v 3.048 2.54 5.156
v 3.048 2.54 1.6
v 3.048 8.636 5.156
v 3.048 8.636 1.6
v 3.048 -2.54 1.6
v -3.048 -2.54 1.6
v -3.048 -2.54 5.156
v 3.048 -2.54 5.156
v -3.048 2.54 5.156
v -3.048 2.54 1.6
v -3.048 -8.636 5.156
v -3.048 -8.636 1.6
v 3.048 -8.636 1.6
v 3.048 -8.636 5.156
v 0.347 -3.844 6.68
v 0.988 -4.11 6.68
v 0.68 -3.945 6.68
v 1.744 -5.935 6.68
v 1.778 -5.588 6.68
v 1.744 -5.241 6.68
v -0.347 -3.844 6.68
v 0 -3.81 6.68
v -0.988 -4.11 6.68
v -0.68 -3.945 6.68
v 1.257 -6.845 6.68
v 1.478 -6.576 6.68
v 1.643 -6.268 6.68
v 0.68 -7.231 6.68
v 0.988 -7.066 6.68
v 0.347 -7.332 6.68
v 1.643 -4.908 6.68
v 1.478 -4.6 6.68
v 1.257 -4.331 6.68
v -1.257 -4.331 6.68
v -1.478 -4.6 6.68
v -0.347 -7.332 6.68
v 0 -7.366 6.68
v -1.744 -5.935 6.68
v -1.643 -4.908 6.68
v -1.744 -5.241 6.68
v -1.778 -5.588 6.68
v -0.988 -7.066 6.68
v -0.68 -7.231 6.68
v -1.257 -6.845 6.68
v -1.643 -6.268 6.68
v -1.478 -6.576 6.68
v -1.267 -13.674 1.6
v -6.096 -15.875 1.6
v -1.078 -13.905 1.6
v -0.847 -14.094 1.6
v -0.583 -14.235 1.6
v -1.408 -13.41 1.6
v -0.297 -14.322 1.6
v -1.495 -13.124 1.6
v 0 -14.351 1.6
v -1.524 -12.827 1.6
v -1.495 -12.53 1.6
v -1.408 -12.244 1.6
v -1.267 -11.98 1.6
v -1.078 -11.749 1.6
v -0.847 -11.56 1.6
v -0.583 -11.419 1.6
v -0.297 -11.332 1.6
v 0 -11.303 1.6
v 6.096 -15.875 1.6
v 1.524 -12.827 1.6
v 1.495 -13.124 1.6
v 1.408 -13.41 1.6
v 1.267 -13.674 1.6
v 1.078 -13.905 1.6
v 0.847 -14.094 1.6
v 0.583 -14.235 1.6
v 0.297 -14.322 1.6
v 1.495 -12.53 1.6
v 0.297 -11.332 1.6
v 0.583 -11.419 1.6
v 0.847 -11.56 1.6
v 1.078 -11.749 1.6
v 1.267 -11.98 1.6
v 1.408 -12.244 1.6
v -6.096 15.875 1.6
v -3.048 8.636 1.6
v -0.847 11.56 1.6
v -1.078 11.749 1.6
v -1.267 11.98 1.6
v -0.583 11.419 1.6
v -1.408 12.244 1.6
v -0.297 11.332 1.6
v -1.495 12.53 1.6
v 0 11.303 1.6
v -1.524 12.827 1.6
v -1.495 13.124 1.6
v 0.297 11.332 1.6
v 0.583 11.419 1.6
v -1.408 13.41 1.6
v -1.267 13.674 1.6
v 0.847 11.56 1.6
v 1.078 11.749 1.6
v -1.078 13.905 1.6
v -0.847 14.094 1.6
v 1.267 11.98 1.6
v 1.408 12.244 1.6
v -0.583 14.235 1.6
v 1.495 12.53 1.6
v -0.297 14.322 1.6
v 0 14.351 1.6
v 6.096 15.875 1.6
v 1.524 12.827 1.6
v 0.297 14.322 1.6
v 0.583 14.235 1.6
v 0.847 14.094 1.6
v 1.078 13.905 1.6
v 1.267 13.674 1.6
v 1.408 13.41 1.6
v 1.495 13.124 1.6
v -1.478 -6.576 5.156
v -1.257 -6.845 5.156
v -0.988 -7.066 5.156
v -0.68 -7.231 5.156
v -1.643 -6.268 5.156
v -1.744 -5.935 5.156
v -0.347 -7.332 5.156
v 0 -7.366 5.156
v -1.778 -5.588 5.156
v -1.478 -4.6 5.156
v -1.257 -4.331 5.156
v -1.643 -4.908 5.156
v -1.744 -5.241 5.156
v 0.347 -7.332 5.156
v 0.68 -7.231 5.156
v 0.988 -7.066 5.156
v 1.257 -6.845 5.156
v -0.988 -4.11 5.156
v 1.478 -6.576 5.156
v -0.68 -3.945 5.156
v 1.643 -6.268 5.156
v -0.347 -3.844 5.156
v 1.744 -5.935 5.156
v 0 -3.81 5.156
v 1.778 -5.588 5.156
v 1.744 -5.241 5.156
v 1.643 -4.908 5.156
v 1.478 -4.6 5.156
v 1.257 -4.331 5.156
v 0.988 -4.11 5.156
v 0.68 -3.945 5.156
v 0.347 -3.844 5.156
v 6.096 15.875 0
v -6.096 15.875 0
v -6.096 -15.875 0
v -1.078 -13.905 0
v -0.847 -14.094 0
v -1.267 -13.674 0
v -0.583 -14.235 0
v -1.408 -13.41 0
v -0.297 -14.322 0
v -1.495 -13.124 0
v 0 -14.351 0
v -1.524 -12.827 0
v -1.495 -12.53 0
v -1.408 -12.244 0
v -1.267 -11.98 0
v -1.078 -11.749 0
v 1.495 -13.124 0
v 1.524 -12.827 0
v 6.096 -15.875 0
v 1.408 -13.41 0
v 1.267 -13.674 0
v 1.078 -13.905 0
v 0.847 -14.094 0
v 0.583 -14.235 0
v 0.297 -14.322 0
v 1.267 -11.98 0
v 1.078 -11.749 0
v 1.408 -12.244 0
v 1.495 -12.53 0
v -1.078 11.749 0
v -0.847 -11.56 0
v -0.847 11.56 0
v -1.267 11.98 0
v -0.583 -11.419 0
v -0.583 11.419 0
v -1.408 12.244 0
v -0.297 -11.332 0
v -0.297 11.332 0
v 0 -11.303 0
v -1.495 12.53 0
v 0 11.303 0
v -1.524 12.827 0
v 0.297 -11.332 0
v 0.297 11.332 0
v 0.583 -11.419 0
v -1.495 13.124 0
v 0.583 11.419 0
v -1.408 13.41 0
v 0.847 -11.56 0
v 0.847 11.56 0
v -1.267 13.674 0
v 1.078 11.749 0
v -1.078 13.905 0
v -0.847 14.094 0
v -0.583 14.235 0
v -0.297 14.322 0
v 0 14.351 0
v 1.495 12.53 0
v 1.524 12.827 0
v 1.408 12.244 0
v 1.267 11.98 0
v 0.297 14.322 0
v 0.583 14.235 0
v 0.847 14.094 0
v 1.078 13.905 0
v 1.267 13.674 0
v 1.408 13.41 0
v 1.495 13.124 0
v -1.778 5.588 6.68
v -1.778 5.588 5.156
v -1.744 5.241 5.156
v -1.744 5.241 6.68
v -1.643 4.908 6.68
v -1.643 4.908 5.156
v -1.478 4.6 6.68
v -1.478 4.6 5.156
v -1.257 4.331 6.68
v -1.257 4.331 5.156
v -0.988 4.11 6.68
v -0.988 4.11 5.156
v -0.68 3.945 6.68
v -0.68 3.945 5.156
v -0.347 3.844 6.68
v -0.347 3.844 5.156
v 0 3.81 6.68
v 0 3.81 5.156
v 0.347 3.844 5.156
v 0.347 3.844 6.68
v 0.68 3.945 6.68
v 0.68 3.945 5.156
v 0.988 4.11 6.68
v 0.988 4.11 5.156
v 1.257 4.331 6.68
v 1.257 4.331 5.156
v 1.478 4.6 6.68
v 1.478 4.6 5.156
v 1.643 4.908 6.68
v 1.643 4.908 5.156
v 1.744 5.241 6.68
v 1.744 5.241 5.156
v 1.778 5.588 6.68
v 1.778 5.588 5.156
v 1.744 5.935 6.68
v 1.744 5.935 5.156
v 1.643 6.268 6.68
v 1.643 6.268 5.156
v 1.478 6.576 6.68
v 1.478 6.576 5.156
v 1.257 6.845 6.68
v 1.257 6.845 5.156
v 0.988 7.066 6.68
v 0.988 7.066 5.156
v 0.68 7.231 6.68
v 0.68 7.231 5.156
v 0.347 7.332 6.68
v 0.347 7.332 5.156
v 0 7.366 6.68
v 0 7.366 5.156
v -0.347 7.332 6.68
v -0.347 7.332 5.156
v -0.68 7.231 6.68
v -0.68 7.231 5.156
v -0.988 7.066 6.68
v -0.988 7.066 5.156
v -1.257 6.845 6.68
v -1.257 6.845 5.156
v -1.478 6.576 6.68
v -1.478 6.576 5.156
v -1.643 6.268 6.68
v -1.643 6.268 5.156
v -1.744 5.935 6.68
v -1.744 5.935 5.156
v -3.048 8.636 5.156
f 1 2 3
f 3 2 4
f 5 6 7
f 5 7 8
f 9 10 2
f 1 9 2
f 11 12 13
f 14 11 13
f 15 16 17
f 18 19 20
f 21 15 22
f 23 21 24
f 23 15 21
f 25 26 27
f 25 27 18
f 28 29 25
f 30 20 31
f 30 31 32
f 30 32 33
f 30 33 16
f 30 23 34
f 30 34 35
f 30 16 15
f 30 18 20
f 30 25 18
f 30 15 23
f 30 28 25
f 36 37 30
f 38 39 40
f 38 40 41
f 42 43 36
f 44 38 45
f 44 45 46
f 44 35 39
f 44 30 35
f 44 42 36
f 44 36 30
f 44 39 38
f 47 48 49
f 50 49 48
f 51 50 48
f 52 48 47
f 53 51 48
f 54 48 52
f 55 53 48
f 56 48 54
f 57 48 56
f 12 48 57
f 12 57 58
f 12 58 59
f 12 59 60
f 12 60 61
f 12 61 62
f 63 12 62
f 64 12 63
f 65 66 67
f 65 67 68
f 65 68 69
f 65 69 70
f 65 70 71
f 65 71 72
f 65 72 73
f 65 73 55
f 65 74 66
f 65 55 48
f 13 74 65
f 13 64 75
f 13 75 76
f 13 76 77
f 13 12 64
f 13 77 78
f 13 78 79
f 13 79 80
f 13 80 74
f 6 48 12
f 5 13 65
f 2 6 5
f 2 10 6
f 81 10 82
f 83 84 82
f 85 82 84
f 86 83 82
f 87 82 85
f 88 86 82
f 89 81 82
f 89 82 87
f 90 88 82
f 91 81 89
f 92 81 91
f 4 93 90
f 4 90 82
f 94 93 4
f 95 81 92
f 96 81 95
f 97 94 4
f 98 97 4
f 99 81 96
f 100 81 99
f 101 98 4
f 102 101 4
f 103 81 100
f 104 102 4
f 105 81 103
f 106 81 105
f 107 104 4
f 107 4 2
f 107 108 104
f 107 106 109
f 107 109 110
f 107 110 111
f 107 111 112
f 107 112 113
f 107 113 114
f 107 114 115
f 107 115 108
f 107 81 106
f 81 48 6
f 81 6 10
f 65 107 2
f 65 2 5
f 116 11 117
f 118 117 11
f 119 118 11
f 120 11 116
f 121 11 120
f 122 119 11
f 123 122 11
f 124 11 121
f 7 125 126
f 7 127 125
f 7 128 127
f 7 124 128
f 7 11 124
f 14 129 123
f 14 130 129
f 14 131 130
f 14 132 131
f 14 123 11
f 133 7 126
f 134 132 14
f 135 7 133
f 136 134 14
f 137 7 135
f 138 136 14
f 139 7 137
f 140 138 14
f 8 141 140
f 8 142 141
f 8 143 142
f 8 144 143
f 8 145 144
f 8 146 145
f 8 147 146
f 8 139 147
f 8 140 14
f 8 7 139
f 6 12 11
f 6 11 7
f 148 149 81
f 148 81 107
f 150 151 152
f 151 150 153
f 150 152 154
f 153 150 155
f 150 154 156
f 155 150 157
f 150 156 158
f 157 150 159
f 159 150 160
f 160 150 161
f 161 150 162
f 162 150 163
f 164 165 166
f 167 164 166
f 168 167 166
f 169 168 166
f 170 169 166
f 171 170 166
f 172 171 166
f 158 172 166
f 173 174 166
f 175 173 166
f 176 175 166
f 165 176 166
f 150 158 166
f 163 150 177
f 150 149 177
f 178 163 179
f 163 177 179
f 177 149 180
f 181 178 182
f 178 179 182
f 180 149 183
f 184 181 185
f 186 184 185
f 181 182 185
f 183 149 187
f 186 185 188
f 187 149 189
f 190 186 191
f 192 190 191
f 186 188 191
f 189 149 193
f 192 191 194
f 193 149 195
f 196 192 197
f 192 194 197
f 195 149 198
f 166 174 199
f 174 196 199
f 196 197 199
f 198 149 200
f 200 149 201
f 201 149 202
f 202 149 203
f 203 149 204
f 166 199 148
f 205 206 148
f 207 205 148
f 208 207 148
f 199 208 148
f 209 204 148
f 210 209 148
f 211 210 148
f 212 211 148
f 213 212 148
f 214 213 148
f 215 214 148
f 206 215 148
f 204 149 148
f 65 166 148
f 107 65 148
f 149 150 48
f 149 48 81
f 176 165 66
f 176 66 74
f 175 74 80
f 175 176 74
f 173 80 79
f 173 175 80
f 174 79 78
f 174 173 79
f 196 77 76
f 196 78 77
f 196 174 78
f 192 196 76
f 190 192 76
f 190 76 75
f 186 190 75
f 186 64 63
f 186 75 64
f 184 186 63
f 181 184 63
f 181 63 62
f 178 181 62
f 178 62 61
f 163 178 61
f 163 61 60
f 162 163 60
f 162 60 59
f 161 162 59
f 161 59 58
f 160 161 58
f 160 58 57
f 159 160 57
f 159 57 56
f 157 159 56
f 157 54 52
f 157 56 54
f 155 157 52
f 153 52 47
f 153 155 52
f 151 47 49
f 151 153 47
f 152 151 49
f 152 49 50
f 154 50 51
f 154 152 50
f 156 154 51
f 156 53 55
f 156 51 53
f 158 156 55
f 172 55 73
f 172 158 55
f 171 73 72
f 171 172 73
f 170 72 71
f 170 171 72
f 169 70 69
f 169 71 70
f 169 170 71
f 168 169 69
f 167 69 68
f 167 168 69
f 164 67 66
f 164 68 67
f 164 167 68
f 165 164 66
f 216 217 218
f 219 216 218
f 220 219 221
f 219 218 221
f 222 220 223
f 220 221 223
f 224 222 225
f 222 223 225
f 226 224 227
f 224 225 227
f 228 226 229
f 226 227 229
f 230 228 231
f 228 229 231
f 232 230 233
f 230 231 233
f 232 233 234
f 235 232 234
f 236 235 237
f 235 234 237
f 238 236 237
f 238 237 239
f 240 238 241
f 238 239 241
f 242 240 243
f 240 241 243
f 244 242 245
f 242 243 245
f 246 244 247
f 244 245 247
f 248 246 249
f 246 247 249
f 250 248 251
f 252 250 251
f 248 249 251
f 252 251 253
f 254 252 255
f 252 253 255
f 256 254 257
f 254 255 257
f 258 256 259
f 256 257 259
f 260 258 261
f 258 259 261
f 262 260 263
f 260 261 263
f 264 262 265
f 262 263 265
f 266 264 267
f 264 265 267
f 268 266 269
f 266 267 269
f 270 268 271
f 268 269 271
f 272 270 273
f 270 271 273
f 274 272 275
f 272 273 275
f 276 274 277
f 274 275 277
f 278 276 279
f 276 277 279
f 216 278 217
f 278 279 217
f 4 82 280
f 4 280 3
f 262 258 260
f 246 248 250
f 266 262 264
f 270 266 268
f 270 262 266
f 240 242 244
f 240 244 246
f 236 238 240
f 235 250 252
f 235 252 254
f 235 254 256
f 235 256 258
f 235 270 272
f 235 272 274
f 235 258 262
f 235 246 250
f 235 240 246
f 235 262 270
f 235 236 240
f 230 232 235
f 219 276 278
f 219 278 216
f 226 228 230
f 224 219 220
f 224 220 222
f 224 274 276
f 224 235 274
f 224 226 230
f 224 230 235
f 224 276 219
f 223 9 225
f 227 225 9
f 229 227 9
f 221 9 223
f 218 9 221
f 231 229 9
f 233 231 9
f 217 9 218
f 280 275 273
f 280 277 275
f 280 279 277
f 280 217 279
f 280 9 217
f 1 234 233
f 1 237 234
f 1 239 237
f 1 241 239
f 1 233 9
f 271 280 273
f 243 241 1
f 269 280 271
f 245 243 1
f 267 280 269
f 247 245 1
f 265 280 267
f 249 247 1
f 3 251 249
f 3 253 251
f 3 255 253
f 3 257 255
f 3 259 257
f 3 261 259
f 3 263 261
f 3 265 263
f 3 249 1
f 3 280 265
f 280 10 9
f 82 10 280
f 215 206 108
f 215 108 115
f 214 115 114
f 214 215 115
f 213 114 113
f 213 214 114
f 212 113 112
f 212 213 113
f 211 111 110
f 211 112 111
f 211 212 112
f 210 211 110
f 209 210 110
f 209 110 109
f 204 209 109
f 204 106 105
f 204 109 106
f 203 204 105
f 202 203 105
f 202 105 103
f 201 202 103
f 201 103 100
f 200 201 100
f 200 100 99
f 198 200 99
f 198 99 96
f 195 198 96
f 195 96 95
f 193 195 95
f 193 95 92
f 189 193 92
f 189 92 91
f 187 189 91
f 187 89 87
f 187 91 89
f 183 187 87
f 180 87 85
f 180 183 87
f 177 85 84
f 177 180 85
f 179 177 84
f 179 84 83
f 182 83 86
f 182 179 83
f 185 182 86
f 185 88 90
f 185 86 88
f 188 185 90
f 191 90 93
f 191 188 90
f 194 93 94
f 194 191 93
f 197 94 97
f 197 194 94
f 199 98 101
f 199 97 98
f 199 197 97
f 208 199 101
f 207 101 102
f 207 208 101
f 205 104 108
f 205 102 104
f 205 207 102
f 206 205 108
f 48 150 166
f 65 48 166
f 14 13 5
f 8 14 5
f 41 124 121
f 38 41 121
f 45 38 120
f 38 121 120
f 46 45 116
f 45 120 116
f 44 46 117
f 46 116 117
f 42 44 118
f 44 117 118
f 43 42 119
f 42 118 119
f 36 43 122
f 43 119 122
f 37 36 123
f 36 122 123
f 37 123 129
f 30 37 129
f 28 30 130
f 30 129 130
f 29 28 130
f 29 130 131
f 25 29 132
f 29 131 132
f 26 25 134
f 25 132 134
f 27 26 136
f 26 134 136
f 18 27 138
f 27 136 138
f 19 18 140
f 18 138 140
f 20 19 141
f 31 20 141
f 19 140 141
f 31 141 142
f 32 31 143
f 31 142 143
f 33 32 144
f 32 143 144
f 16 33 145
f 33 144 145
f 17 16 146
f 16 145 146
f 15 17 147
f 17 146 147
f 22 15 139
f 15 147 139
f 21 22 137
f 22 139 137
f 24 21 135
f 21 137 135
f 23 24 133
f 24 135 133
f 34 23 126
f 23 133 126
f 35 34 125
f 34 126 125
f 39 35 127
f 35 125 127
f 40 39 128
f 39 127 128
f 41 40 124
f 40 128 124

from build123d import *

# Parameters (mm, degrees)
SKETCH1_W               = 12.192
SKETCH1_H               = 31.75
BOSS_EXTRUDE1_DEPTH     = 1.6002
SKETCH2_W               = 6.096
SKETCH2_H               = 6.096
BOSS_EXTRUDE2_DEPTH     = 3.556
SKETCH3_R               = 1.778
BOSS_EXTRUDE3_DEPTH     = 1.524
CUT_EXTRUDE1_DEPTH      = 18.747767212
CUT_EXTRUDE1_DEPTH_BACK = 18.747767212
SKETCH4_R               = 1.524


with BuildPart() as part:
    # Sketch1 → Boss-Extrude1 (new body)
    with BuildSketch(Plane.XY):
        Rectangle(SKETCH1_W, SKETCH1_H)
    extrude(amount=BOSS_EXTRUDE1_DEPTH)

    # Sketch2 → Boss-Extrude2 (add)
    with BuildSketch(Plane.XY.offset(1.6002)):
        with Locations((0, 5.588)):
            Rectangle(SKETCH2_W, SKETCH2_H)
        with Locations((0, -5.588)):
            Rectangle(SKETCH2_W, SKETCH2_H)
    extrude(amount=BOSS_EXTRUDE2_DEPTH)

    # Sketch3 → Boss-Extrude3 (add)
    with BuildSketch(Plane.XY.offset(5.1562)):
        with Locations(Location((0, 5.588, 0), (0, 0, 180))):
            Circle(SKETCH3_R)
        with Locations(Location((0, -5.588, 0), (0, 0, 180))):
            Circle(SKETCH3_R)
    extrude(amount=BOSS_EXTRUDE3_DEPTH)

    # Sketch4 → Cut-Extrude1 (cut, two sides: drawn at the far end of the back side and taken through both)
    with BuildSketch(Plane.XY.offset(1.6002).offset(-CUT_EXTRUDE1_DEPTH_BACK)):
        with Locations((0, 12.827)):
            Circle(SKETCH4_R)
        with Locations((0, -12.827)):
            Circle(SKETCH4_R)
    extrude(amount=CUT_EXTRUDE1_DEPTH + CUT_EXTRUDE1_DEPTH_BACK, mode=Mode.SUBTRACT)


solid = part.part
